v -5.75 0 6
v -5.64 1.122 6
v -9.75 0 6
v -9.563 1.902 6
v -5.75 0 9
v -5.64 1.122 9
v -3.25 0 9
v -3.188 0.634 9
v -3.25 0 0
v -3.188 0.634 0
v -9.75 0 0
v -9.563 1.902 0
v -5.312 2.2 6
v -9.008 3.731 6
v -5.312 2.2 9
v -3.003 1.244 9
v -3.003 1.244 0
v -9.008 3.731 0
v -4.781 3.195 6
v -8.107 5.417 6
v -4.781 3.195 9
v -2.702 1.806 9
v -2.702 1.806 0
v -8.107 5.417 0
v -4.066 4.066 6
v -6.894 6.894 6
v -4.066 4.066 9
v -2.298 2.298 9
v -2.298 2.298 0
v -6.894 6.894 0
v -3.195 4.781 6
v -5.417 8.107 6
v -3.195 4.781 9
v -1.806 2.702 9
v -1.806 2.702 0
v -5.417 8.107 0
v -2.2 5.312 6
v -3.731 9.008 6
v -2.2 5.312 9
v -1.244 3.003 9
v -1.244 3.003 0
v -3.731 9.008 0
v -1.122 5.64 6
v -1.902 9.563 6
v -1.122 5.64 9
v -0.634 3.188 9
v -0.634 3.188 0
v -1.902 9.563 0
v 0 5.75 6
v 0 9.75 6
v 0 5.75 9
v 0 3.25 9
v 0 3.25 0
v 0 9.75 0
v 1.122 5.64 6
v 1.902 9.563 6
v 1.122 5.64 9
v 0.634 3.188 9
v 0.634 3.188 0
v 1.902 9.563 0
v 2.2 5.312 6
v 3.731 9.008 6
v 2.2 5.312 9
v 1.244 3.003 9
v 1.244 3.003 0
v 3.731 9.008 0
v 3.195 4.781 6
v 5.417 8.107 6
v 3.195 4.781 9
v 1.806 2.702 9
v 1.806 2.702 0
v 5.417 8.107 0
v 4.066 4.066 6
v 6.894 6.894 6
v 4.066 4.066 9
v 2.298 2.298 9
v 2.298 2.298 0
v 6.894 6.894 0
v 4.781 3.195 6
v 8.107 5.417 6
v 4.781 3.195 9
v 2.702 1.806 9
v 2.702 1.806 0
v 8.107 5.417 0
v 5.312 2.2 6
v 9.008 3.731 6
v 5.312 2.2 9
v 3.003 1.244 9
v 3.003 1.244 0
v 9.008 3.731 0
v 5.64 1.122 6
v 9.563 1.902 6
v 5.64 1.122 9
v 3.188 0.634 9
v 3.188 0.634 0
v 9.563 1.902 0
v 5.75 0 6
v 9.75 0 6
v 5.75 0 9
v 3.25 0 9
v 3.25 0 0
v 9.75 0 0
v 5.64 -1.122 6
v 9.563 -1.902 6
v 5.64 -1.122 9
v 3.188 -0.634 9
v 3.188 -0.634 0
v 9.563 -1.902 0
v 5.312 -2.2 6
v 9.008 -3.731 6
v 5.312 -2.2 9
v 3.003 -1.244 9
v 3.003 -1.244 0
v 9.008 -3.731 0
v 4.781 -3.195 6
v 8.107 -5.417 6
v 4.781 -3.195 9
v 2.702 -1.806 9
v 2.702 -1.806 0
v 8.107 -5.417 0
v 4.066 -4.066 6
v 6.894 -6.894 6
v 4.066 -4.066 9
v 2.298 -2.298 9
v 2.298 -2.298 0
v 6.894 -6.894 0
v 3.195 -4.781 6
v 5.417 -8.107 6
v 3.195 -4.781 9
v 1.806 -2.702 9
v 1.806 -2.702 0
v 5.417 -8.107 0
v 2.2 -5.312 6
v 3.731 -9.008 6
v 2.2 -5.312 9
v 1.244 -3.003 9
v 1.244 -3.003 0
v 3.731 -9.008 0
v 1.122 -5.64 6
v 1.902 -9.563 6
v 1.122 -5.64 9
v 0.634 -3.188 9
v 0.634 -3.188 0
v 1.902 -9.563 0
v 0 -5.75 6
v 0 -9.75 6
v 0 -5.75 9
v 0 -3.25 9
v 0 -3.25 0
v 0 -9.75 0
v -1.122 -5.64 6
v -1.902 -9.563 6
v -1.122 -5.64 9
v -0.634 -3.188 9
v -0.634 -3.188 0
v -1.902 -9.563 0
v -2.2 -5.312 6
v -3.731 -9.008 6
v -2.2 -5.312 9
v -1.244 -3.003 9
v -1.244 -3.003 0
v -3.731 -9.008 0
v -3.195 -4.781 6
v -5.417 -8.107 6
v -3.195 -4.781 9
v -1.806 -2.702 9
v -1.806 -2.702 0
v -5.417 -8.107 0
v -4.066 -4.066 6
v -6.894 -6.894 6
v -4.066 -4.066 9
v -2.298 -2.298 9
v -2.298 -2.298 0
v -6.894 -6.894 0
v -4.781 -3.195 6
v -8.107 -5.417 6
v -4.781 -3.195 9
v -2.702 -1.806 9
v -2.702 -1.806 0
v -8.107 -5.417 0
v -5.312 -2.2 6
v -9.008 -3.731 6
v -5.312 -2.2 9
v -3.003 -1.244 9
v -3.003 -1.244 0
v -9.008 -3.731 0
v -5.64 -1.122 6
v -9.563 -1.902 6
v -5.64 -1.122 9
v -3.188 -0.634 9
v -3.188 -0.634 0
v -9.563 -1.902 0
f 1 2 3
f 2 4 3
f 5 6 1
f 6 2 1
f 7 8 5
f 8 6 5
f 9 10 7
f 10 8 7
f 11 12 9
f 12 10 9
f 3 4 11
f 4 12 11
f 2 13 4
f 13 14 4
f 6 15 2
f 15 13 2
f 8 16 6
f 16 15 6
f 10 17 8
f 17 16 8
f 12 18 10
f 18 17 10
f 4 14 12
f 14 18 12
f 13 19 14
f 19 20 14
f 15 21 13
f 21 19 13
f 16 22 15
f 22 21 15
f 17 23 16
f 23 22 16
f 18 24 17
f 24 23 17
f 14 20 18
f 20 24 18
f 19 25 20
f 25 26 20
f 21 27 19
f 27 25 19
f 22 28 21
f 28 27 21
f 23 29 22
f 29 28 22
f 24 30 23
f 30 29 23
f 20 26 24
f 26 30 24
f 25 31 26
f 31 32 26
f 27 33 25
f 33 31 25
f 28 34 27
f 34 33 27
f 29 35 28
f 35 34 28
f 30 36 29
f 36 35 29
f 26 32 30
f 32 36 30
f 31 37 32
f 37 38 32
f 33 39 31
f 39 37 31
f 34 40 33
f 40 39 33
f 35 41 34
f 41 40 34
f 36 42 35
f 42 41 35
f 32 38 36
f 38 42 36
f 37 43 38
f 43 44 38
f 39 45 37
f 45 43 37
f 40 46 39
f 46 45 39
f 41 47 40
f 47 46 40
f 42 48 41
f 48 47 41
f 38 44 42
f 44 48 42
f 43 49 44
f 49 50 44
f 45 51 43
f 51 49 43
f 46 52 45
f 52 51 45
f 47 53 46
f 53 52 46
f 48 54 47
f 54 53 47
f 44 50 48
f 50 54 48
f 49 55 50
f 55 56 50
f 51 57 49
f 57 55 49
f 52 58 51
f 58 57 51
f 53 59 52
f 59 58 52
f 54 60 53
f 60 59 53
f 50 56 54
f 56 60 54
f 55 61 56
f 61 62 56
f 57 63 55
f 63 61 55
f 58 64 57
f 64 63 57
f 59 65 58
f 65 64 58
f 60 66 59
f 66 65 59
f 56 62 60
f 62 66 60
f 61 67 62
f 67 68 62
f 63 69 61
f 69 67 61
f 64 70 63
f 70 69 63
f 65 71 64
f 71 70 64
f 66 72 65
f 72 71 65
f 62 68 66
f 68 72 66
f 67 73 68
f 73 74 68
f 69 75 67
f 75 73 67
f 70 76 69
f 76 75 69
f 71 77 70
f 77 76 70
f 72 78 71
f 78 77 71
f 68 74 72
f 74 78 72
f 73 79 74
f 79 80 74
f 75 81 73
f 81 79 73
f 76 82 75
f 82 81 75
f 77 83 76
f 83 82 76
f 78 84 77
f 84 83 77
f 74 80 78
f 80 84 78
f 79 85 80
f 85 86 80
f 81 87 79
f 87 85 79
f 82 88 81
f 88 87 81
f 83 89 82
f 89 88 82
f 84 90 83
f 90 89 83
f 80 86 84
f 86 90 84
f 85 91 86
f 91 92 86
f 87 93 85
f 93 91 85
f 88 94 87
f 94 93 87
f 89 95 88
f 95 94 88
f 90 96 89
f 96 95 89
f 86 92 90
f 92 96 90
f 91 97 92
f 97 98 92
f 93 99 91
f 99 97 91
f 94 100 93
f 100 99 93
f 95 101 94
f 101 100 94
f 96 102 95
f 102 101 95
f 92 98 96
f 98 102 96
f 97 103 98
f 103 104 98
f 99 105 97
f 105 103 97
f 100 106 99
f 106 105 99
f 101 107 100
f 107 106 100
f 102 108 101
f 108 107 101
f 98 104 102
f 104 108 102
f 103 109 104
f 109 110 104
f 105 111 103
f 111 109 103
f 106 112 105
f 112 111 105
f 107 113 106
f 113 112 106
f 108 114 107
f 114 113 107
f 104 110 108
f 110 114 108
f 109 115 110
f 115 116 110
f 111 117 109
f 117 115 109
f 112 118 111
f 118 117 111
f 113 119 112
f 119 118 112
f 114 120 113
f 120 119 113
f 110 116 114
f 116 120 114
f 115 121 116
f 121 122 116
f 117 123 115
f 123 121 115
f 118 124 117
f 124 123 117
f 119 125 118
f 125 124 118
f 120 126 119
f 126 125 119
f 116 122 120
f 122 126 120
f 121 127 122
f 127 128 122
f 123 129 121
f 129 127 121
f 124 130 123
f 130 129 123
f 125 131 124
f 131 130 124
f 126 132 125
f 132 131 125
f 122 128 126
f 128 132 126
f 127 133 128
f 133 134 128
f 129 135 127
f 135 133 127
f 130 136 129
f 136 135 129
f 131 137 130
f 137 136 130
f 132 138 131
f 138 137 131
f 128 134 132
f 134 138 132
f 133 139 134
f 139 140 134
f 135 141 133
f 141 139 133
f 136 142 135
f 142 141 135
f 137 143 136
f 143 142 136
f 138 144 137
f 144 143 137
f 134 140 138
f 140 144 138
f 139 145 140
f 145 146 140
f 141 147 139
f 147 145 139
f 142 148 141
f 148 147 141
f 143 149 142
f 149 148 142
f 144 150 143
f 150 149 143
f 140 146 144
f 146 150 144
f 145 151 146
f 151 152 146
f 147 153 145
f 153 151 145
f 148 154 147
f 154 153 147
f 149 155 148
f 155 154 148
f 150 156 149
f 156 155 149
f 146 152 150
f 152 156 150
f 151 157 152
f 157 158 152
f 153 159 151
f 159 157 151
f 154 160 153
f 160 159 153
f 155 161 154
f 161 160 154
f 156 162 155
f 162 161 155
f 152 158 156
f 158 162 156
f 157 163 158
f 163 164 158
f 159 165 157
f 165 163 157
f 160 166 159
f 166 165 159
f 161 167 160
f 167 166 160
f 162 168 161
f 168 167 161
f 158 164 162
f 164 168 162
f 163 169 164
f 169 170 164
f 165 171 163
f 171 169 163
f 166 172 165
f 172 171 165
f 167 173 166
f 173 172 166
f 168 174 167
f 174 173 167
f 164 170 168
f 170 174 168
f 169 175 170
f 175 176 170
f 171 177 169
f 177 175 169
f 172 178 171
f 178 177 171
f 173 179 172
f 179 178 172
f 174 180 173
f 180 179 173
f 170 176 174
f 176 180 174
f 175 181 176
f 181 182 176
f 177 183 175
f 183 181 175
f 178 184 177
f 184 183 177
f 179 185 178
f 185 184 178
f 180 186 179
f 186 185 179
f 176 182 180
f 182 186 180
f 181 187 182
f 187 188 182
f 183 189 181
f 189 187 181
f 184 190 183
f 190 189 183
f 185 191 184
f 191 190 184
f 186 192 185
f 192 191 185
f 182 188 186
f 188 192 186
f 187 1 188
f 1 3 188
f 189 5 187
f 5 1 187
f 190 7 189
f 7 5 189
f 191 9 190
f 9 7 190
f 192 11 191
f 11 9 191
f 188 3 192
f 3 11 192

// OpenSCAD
$fn = 32;

// ----------------------------------------------------------------------
// Form washer: stepped_c washer, 19.5 mm outside, 6.5 mm bore
// ----------------------------------------------------------------------

// --- parameters (mm) ---
revolve_angle = 360;      // full turn around the Z axis
profile_points = 6;       // points of the closed outline

profile = [[3.25, 0], [9.75, 0], [9.75, 6], [5.75, 6], [5.75, 9], [3.25, 9]];  // single closed polygon, 6 points, counter clockwise

// --- the one profile operation ---
rotate_extrude(angle = revolve_angle) polygon(points = profile);
